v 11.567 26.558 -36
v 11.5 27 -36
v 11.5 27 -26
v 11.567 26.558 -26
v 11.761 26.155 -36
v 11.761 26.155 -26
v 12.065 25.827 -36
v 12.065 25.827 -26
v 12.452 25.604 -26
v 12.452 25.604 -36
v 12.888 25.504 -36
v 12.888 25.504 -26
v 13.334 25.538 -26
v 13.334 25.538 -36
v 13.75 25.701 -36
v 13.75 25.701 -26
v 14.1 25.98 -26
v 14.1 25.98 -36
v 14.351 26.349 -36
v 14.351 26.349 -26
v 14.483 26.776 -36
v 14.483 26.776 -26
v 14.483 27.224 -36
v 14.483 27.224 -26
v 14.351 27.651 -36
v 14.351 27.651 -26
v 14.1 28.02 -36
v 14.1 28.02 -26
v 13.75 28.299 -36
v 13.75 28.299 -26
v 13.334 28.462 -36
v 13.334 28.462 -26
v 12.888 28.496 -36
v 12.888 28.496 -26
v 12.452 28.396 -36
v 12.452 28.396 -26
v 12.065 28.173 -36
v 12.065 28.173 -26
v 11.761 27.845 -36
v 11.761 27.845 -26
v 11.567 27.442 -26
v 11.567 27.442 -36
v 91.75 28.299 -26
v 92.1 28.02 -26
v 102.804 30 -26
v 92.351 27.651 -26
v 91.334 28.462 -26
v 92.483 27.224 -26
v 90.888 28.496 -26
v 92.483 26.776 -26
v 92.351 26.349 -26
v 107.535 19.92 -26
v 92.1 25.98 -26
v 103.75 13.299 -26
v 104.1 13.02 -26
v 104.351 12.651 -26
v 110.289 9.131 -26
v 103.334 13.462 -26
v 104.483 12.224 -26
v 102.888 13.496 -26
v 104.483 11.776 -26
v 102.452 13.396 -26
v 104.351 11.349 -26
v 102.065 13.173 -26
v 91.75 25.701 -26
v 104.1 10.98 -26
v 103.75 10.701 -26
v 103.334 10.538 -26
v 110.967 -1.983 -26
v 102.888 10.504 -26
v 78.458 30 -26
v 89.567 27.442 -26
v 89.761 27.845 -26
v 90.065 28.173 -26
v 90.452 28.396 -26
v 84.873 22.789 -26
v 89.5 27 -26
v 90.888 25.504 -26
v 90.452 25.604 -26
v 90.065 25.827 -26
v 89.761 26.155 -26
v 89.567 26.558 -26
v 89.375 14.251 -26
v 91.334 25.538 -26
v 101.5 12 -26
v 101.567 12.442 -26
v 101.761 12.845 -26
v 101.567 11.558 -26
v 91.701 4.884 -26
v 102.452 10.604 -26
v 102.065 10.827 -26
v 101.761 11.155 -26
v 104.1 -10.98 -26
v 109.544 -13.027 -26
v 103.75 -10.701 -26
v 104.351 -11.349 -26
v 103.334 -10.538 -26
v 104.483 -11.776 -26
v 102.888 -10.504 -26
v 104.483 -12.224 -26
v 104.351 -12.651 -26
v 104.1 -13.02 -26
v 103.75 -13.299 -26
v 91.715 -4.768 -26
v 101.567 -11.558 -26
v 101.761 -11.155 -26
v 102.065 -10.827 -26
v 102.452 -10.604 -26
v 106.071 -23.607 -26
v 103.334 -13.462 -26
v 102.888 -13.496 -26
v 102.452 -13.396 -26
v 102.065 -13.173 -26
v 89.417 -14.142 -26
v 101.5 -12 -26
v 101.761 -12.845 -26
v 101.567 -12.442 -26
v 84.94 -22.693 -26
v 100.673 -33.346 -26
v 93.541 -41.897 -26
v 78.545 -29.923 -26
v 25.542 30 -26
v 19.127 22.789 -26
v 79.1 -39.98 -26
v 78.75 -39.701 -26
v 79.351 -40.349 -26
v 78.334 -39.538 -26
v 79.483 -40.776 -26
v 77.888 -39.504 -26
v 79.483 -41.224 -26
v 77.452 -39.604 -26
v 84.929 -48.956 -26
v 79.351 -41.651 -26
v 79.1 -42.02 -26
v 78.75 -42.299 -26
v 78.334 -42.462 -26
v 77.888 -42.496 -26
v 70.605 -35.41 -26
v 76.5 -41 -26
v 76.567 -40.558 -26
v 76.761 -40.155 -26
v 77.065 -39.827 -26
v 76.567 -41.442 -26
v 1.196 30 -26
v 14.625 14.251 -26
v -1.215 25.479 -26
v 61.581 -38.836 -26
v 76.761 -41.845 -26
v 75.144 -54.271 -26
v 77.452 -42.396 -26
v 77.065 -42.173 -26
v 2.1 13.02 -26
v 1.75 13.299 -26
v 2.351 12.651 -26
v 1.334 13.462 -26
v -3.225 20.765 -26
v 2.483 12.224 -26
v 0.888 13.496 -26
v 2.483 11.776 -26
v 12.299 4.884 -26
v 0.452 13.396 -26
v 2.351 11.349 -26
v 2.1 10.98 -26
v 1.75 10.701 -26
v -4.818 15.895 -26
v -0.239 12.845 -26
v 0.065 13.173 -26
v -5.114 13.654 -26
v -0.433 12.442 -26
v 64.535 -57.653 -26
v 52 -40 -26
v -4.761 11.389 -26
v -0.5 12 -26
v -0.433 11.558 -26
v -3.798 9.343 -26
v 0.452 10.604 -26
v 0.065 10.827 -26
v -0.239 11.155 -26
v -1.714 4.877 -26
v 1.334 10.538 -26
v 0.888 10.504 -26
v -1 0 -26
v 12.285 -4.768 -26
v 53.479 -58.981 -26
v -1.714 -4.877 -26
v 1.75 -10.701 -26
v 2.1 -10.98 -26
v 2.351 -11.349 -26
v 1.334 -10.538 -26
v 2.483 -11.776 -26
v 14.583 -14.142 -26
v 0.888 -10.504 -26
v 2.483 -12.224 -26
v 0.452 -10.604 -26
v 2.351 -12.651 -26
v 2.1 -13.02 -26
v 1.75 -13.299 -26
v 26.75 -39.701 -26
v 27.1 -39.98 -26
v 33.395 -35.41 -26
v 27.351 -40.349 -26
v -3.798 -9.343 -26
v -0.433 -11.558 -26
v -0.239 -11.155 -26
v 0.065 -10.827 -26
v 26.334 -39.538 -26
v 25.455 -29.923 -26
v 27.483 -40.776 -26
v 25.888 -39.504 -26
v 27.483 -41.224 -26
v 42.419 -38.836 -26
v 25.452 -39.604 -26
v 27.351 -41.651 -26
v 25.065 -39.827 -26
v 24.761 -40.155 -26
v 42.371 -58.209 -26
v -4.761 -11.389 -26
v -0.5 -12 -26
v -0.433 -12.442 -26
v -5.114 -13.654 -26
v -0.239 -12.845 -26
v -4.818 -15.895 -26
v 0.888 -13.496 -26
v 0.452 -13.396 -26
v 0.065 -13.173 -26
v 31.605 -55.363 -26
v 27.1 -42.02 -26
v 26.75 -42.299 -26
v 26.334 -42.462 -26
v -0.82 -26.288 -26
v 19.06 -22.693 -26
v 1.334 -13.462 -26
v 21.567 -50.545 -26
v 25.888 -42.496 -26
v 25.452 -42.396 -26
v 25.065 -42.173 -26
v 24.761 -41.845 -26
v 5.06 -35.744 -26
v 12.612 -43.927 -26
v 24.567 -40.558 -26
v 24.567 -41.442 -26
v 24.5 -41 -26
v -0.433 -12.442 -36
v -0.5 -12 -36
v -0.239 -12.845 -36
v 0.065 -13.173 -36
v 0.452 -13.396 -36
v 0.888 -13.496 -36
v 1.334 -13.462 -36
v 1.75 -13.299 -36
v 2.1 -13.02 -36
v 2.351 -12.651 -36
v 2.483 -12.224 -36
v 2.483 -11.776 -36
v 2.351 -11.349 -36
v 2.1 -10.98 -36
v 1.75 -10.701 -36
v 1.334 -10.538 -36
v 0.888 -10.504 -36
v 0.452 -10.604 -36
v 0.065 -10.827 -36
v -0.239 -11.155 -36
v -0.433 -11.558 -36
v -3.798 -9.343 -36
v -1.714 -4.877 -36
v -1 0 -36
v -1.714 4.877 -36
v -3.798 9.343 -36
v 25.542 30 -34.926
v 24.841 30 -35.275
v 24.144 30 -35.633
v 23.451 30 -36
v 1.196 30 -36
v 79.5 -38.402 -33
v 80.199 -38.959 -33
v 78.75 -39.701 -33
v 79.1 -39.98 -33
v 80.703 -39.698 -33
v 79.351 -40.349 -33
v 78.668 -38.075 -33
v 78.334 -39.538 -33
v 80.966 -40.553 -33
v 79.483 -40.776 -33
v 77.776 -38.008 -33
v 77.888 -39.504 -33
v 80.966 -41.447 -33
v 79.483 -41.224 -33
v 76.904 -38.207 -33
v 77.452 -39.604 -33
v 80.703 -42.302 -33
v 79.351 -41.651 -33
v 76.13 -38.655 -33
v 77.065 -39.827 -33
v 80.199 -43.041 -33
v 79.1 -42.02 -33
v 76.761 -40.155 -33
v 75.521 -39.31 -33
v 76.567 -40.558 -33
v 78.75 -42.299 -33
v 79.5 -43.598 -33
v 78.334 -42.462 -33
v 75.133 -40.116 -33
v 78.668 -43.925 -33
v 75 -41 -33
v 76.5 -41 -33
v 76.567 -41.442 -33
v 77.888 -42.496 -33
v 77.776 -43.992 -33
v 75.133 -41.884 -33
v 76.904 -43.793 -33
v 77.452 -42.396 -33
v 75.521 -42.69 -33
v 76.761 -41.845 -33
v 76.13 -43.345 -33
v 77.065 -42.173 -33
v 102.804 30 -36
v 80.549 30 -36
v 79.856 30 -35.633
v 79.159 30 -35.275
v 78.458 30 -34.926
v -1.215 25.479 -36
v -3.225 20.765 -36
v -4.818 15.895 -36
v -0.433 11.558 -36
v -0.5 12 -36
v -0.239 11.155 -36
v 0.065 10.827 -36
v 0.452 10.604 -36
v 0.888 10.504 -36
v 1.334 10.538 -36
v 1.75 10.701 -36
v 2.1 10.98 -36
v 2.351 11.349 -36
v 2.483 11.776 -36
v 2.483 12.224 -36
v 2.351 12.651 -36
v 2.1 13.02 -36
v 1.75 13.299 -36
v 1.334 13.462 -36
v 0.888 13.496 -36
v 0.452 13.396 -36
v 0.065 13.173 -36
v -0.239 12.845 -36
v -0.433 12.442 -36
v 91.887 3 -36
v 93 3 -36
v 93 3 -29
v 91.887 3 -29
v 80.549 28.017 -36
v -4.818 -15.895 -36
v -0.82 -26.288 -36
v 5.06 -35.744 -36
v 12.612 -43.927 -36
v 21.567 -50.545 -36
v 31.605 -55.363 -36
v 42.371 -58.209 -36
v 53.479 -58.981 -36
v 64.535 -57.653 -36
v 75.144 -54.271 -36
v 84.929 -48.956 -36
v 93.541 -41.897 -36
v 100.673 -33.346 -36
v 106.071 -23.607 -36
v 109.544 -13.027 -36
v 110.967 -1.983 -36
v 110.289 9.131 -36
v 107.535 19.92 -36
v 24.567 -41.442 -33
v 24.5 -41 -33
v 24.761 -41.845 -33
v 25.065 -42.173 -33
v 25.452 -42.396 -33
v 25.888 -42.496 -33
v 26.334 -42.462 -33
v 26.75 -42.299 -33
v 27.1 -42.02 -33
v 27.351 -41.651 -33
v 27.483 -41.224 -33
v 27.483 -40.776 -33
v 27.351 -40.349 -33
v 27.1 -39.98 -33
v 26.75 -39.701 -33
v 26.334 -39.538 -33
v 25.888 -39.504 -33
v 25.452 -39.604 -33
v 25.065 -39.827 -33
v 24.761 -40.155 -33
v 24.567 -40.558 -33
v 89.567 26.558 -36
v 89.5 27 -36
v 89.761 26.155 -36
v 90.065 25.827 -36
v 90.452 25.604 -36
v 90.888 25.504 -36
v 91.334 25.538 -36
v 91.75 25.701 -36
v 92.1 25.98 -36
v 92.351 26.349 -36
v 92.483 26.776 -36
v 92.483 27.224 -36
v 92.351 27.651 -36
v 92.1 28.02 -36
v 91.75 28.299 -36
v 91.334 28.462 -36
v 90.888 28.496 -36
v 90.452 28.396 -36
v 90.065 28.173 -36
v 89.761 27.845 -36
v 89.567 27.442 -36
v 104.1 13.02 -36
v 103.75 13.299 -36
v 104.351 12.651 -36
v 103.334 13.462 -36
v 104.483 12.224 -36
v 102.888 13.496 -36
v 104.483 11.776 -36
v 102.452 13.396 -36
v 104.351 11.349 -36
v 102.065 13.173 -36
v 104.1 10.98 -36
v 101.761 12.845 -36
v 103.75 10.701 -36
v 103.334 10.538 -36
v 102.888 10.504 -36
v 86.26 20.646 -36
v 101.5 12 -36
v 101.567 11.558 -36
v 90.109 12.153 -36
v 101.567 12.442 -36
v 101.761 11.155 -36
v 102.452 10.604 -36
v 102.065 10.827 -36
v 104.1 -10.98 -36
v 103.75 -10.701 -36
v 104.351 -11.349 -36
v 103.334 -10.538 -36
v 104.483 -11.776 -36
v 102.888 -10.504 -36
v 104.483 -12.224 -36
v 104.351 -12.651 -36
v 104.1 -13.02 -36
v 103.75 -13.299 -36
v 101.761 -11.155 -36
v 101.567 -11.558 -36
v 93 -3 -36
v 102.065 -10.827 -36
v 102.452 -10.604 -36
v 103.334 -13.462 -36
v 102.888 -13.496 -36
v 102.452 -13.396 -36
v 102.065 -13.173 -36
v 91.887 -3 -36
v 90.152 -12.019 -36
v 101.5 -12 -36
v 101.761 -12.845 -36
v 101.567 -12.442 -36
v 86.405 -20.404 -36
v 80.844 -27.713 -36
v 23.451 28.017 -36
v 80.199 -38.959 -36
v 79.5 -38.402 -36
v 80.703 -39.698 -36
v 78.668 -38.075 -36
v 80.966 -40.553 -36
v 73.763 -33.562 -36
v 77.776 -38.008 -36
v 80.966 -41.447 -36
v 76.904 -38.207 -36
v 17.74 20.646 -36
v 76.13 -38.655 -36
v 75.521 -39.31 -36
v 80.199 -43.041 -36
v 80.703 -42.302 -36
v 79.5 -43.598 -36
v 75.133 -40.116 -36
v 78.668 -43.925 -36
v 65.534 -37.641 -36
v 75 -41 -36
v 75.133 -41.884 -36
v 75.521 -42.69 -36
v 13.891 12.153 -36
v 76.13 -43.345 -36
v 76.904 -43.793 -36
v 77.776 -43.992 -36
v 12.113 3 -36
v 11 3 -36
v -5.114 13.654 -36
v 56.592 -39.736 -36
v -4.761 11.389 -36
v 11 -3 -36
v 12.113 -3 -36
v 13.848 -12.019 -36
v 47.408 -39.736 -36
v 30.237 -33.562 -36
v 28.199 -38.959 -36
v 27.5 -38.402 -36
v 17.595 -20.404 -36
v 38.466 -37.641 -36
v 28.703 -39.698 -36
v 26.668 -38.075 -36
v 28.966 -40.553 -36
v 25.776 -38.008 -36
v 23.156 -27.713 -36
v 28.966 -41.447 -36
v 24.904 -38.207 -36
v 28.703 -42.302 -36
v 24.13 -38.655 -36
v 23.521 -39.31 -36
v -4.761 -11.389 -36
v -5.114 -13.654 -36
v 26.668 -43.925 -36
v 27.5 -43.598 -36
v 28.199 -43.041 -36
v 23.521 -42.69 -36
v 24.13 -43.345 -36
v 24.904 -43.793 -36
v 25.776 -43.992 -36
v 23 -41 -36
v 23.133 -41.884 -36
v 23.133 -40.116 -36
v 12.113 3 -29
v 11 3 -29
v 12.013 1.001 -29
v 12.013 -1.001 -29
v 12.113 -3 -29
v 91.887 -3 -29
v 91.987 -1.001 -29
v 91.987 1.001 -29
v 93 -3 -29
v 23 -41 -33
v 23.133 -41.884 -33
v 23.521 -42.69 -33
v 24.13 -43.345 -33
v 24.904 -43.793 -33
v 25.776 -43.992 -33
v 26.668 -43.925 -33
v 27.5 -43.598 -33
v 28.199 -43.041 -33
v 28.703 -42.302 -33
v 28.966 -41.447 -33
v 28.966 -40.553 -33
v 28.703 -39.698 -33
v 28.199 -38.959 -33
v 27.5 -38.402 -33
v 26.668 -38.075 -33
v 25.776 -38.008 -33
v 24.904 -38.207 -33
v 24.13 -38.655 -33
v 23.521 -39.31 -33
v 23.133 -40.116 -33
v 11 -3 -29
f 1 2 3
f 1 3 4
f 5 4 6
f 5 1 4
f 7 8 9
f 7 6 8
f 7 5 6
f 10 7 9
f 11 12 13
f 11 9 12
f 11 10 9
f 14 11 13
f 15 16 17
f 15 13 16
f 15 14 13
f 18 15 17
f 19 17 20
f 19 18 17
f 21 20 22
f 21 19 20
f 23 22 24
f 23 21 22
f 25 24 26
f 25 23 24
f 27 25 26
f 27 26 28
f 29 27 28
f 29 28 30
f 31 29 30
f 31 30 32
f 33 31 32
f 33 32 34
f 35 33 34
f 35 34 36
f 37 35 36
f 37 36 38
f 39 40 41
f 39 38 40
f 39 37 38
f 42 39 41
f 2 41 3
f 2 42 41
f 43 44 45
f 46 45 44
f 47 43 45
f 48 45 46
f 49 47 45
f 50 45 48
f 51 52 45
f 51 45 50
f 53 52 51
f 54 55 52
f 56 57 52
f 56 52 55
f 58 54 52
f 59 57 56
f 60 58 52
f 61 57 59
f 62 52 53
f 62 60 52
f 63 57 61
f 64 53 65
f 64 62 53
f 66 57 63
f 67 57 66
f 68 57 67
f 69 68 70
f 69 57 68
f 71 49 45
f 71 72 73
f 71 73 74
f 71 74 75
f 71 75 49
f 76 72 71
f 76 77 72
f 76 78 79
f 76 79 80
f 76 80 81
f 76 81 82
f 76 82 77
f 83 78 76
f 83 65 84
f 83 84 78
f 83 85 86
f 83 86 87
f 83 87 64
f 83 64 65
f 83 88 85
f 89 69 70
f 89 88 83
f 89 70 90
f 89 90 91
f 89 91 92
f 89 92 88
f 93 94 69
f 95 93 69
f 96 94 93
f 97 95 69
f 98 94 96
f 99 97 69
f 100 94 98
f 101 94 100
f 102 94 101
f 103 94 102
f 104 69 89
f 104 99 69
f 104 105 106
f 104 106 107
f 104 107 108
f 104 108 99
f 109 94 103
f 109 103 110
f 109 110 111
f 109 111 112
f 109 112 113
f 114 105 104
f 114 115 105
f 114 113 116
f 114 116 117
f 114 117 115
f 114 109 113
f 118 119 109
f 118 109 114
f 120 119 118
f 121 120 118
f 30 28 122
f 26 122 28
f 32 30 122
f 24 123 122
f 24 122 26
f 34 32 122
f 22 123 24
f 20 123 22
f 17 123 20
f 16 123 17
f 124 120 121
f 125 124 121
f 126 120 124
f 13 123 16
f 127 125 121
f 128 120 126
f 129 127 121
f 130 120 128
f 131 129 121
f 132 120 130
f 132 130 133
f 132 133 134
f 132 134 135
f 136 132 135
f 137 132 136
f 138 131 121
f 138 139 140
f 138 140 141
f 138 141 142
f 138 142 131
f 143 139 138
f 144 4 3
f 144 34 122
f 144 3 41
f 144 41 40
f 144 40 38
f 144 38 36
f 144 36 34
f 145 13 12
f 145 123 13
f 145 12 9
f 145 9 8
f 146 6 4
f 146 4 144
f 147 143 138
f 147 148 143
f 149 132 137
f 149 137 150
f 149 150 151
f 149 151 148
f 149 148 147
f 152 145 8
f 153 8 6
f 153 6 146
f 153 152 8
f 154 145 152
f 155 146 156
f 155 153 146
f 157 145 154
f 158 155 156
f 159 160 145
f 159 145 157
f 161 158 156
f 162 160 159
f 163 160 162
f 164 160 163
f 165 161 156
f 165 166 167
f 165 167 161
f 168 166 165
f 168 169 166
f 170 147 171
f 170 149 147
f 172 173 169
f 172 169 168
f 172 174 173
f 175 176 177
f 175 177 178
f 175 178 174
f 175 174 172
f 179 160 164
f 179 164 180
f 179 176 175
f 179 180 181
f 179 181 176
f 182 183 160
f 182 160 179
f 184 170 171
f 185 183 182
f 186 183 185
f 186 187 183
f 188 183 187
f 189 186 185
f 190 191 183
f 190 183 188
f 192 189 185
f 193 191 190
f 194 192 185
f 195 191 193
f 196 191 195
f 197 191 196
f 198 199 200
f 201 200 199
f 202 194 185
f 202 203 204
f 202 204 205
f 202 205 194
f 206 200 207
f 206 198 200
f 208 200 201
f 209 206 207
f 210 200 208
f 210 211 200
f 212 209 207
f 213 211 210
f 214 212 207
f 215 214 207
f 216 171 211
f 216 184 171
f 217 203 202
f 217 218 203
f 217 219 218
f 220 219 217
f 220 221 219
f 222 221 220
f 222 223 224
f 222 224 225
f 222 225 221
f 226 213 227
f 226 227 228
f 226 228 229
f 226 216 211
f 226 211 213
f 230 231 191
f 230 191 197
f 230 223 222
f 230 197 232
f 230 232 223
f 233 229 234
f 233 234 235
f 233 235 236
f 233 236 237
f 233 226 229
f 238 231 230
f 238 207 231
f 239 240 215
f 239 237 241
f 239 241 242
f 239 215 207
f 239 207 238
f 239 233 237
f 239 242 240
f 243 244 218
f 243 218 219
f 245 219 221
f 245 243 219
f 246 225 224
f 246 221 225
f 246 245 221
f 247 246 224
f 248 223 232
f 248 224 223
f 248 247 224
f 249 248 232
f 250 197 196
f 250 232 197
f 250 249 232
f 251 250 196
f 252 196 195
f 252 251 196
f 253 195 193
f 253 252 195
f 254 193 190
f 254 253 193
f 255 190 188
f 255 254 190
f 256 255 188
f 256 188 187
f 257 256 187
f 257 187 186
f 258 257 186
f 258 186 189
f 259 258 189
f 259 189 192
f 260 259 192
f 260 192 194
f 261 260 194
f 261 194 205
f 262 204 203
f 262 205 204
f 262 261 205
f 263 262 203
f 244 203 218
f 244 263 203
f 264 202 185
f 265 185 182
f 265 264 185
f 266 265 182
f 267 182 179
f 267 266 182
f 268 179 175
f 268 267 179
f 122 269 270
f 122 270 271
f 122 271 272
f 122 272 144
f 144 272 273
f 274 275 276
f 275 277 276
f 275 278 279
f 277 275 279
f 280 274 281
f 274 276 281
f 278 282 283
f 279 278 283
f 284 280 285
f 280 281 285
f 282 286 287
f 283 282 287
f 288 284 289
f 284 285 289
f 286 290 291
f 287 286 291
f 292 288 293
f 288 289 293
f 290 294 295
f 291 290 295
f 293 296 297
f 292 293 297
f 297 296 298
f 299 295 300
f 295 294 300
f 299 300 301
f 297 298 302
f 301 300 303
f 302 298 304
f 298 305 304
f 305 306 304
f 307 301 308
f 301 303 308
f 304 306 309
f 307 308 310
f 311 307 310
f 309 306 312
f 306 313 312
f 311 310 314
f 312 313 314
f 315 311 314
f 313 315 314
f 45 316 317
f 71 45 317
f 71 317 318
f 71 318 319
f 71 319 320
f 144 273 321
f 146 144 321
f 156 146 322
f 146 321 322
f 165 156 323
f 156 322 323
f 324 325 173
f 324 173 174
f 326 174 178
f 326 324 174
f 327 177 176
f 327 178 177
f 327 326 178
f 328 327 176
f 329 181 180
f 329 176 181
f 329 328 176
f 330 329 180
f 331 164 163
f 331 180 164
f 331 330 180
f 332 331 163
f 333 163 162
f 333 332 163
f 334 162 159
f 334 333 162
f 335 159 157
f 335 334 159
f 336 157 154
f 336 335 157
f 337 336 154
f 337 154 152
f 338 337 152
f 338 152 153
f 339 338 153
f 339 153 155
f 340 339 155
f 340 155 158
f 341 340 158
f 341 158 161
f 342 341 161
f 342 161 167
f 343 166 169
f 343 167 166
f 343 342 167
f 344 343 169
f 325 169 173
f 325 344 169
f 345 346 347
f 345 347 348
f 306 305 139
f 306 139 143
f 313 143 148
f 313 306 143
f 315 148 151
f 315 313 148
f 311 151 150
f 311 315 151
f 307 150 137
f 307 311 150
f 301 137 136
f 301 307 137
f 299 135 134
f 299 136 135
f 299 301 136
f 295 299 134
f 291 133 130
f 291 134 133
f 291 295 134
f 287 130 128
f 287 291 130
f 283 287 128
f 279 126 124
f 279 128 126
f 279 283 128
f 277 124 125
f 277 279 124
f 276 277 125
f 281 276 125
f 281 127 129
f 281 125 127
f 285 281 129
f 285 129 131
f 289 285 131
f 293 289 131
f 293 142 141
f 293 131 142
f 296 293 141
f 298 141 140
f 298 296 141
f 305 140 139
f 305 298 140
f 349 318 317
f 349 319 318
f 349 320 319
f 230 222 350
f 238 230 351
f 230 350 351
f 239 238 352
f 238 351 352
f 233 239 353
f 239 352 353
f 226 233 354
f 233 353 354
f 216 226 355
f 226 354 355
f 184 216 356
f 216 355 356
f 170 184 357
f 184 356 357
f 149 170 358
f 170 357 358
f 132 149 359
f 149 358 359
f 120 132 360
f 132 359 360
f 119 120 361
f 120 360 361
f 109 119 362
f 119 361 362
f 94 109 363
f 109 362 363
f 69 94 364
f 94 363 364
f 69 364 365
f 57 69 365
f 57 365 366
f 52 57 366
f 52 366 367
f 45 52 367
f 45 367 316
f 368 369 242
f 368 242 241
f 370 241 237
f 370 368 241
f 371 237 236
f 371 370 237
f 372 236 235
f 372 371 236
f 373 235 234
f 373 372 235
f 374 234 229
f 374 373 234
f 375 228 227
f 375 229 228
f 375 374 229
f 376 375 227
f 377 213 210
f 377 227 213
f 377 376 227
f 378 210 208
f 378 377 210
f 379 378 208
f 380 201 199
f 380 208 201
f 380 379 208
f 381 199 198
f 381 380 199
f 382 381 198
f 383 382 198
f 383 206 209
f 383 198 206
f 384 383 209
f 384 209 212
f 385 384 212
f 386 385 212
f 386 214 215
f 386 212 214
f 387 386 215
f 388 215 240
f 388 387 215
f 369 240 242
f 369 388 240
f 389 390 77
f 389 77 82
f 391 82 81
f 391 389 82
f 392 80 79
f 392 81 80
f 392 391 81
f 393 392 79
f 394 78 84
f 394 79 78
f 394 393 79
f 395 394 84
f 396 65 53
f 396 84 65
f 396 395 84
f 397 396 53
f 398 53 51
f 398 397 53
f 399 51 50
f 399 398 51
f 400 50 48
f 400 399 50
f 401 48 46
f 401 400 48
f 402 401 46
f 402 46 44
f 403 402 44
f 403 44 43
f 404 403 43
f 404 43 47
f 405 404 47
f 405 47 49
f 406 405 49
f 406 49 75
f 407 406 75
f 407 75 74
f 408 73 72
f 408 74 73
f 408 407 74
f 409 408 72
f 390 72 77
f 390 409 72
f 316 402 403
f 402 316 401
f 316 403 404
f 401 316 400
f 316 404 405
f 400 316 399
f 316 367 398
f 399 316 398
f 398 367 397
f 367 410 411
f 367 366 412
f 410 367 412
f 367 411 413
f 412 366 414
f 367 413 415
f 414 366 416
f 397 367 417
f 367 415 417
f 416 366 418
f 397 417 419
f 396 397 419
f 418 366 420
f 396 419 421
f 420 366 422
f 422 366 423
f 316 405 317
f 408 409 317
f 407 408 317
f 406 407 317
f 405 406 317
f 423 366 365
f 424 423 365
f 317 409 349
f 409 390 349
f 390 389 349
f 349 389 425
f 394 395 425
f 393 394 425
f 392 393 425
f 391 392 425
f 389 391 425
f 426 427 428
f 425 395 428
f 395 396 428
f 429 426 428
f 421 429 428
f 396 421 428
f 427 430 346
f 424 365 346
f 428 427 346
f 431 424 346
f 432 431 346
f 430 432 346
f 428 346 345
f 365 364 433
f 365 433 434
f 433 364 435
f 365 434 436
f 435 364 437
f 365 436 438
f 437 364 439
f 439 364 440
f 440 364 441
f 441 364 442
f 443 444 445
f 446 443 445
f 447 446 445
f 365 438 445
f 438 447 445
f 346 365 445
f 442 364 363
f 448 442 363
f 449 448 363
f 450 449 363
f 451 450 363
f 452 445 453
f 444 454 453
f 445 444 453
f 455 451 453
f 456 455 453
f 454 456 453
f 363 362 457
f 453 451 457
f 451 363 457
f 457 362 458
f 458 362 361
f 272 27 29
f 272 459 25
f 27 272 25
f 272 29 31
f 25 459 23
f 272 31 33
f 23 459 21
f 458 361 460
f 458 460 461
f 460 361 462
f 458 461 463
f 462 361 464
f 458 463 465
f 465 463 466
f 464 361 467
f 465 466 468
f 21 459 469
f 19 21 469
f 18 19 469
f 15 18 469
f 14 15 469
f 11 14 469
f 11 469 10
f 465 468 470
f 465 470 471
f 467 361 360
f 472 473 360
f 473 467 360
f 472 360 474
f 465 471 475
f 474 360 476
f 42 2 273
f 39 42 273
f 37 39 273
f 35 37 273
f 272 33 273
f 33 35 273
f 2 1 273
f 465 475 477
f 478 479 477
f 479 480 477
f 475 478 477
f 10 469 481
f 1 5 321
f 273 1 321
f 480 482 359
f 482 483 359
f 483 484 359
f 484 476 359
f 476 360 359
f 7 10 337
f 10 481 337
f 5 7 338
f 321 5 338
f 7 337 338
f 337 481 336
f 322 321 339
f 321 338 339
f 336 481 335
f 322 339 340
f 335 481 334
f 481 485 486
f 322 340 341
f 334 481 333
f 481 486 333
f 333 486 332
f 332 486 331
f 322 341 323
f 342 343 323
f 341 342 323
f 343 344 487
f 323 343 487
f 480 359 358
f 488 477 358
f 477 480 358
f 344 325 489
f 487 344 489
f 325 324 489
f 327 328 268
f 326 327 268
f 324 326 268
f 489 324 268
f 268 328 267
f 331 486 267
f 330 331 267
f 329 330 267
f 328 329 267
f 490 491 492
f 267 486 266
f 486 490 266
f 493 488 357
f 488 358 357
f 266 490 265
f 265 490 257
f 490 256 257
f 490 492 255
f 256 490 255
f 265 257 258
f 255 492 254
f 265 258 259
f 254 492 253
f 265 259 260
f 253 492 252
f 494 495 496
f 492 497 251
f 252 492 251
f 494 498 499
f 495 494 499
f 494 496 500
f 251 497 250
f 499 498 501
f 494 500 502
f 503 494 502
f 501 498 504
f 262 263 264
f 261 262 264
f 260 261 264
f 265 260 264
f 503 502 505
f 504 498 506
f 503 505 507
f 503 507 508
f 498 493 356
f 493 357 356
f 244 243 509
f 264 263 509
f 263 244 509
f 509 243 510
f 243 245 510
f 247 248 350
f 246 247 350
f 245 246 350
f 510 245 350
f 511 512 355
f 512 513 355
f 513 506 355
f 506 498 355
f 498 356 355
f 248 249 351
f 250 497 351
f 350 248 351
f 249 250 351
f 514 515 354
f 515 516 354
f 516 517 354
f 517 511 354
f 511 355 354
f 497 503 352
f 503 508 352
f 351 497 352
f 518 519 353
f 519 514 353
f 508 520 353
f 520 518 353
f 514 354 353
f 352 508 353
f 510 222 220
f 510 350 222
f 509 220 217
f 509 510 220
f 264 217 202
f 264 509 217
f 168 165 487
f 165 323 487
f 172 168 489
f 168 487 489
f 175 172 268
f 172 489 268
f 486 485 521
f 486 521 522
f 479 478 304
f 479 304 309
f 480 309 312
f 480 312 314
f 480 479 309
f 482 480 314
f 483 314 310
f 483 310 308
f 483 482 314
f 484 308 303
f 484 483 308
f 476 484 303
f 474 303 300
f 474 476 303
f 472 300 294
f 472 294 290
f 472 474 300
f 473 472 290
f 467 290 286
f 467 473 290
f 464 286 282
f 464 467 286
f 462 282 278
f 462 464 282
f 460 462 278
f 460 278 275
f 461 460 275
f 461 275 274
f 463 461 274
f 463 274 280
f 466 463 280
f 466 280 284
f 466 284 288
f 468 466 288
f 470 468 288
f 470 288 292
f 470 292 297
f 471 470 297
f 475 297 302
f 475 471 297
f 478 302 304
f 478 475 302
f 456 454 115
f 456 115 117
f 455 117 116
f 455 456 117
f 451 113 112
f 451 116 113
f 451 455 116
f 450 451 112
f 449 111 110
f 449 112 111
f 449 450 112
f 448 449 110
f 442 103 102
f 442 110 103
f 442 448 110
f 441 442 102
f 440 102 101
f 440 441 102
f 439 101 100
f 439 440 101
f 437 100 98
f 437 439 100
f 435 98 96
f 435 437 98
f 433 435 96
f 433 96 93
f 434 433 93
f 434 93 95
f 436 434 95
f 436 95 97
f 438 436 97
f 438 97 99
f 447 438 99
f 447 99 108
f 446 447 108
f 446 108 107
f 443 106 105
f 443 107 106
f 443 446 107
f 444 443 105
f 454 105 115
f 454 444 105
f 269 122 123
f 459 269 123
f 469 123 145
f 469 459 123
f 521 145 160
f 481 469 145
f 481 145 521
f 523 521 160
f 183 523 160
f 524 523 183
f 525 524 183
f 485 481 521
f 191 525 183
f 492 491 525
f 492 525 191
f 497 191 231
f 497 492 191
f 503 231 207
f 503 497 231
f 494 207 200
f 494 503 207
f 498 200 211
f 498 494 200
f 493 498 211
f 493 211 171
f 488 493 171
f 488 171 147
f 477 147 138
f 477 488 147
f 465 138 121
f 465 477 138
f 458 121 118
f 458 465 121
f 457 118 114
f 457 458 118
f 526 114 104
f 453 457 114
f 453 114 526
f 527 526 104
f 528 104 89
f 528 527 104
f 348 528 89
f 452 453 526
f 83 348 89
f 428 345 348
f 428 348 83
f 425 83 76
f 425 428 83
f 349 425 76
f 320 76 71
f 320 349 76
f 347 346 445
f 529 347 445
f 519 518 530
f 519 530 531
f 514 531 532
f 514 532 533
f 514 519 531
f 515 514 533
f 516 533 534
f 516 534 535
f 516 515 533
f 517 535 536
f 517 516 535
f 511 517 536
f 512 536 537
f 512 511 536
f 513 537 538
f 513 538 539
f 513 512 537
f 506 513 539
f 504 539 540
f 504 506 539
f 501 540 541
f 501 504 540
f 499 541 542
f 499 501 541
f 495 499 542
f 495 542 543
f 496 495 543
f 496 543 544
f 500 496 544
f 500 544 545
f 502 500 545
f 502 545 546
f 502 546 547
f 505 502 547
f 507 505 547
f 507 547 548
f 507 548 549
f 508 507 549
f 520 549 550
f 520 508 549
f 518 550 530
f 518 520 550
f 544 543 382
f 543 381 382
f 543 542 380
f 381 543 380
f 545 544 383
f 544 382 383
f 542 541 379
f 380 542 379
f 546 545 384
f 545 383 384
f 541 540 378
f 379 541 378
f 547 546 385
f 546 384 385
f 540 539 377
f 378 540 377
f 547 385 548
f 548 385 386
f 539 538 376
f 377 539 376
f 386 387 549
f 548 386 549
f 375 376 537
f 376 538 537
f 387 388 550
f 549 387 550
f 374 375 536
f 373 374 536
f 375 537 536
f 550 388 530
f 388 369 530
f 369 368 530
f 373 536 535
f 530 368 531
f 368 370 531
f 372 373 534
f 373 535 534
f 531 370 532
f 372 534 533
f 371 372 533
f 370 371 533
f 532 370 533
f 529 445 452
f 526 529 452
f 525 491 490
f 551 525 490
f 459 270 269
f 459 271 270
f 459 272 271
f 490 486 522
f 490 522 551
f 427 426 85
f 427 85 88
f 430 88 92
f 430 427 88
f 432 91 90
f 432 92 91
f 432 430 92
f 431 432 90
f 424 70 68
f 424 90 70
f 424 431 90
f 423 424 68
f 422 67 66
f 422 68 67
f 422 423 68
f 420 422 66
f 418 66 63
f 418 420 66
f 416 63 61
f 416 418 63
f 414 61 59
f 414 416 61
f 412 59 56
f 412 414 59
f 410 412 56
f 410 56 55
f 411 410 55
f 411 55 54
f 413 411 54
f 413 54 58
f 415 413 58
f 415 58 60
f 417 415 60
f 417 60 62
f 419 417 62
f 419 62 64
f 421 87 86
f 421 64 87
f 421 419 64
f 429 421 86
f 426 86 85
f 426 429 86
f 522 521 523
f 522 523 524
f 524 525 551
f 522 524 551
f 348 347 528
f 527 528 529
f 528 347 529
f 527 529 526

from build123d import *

# Parameters (mm, degrees)
CYLINDER2353_R         = 17
CYLINDER2353_DEPTH     = 160
CYLINDER2410_R         = 60.2
CYLINDER2410_DEPTH     = 58
BOX593_W               = 6
BOX593_H               = 6
BOX593_DEPTH           = 64
BOX592_W               = 6
BOX592_H               = 6
BOX592_DEPTH           = 64
CYLINDER2386_R         = 3
CYLINDER2386_DEPTH     = 3
CYLINDER2368_R         = 3
CYLINDER2368_DEPTH     = 3
CYLINDER2394_R         = 1.5
CYLINDER2394_DEPTH     = 32
CYLINDER2392_R         = 1.5
CYLINDER2392_DEPTH     = 32
CYLINDER2391_R         = 1.5
CYLINDER2391_DEPTH     = 100
CYLINDER2406_R         = 1.5
CYLINDER2406_DEPTH     = 100
CYLINDER2396_R         = 1.5
CYLINDER2396_DEPTH     = 50
CYLINDER2393_R         = 1.5
CYLINDER2393_DEPTH     = 50
CYLINDER2389_R         = 1.5
CYLINDER2389_DEPTH     = 50
CYLINDER2398_R         = 1.5
CYLINDER2398_DEPTH     = 50
CYLINDER2379_R         = 1.5
CYLINDER2379_DEPTH     = 100
CYLINDER2399_R         = 1.5
CYLINDER2399_DEPTH     = 100
CYLINDER2401_R         = 1.5
CYLINDER2401_DEPTH     = 100
CYLINDER2405_R         = 1.5
CYLINDER2405_DEPTH     = 100
BOX590_W               = 200
BOX590_H               = 100
BOX590_DEPTH           = 32
TUBE096_R              = 59
TUBE096_R_2            = 40
TUBE096_DEPTH          = 10
CUT574_PLACEMENT_ANGLE = 180
FILLET047_R            = 8


with BuildPart() as v_lec2353:
    # Cylinder2353 → Cylinder2353 (new body)
    with BuildSketch(Plane(origin=(-18, 0, -60), x_dir=(1, 0, 0), z_dir=(0, 0, 1))):
        Circle(CYLINDER2353_R)
    extrude(amount=CYLINDER2353_DEPTH)


with BuildPart() as v_lec2410:
    # Cylinder2410 → Cylinder2410 (new body)
    with BuildSketch(Plane(origin=(0, 19, -53), x_dir=(1, 0, 0), z_dir=(0, -1, 0))):
        Circle(CYLINDER2410_R)
    extrude(amount=CYLINDER2410_DEPTH)


with BuildPart() as krychle593:
    # Box593 → Box593 (new body)
    with BuildSketch(Plane(origin=(87, -3, -93), x_dir=(1, 0, 0), z_dir=(0, 0, 1))):
        with Locations((3, 3)):
            Rectangle(BOX593_W, BOX593_H)
    extrude(amount=BOX593_DEPTH)


with BuildPart() as compound1005:
    # Box592 → Box592 (new body)
    with BuildSketch(Plane(origin=(11, -3, -93), x_dir=(1, 0, 0), z_dir=(0, 0, 1))):
        with Locations((3, 3)):
            Rectangle(BOX592_W, BOX592_H)
    extrude(amount=BOX592_DEPTH)

    # Compound1005: union Krychle593
    add(krychle593.part)


with BuildPart() as compound1005_1:
    # Compound1005 placement: moved
    add(compound1005.part.moved(Location((-52, 0, 36))))


with BuildPart() as v_lec2386:
    # Cylinder2386 → Cylinder2386 (new body)
    with BuildSketch(Plane(origin=(78, 41, -42), x_dir=(1, 0, 0), z_dir=(0, 0, 1))):
        Circle(CYLINDER2386_R)
    extrude(amount=CYLINDER2386_DEPTH)


with BuildPart() as compound1002:
    # Cylinder2368 → Cylinder2368 (new body)
    with BuildSketch(Plane(origin=(26, 41, -42), x_dir=(1, 0, 0), z_dir=(0, 0, 1))):
        Circle(CYLINDER2368_R)
    extrude(amount=CYLINDER2368_DEPTH)

    # Compound1002: union Válec2386
    add(v_lec2386.part)


with BuildPart() as compound1002_1:
    # Compound1002 placement: moved
    add(compound1002.part.moved(Location((-52, 0, 42))))


with BuildPart() as v_lec2394:
    # Cylinder2394 → Cylinder2394 (new body)
    with BuildSketch(Plane(origin=(78, 41, -42), x_dir=(1, 0, 0), z_dir=(0, 0, 1))):
        Circle(CYLINDER2394_R)
    extrude(amount=CYLINDER2394_DEPTH)


with BuildPart() as compound1008:
    # Cylinder2392 → Cylinder2392 (new body)
    with BuildSketch(Plane(origin=(26, 41, -42), x_dir=(1, 0, 0), z_dir=(0, 0, 1))):
        Circle(CYLINDER2392_R)
    extrude(amount=CYLINDER2392_DEPTH)

    # Compound1008: union Válec2394
    add(v_lec2394.part)


with BuildPart() as compound1008_1:
    # Compound1008 placement: moved
    add(compound1008.part.moved(Location((-52, 0, 36))))


with BuildPart() as v_lec2391:
    # Cylinder2391 → Cylinder2391 (new body)
    with BuildSketch(Plane(origin=(14, 0, -60), x_dir=(1, 0, 0), z_dir=(0, 0, 1))):
        Circle(CYLINDER2391_R)
    extrude(amount=CYLINDER2391_DEPTH)


with BuildPart() as compound1006:
    # Cylinder2406 → Cylinder2406 (new body)
    with BuildSketch(Plane(origin=(90, 0, -60), x_dir=(1, 0, 0), z_dir=(0, 0, 1))):
        Circle(CYLINDER2406_R)
    extrude(amount=CYLINDER2406_DEPTH)

    # Compound1022: union Válec2391
    add(v_lec2391.part)


with BuildPart() as compound1006_1:
    # Compound1022 placement: moved
    add(compound1006.part.moved(Location((-52, 0, 0))))

    # Compound1006: union Compound1008
    add(compound1008_1.part)


with BuildPart() as v_lec2396:
    # Cylinder2396 → Cylinder2396 (new body)
    with BuildSketch(Plane(origin=(-51, 6, 0), x_dir=(1, 0, 0), z_dir=(0, 0, 1))):
        Circle(CYLINDER2396_R)
    extrude(amount=CYLINDER2396_DEPTH)


with BuildPart() as v_lec2393:
    # Cylinder2393 → Cylinder2393 (new body)
    with BuildSketch(Plane(origin=(-24, 18, 0), x_dir=(1, 0, 0), z_dir=(0, 0, 1))):
        Circle(CYLINDER2393_R)
    extrude(amount=CYLINDER2393_DEPTH)


with BuildPart() as v_lec2389:
    # Cylinder2389 → Cylinder2389 (new body)
    with BuildSketch(Plane(origin=(24, 18, 0), x_dir=(1, 0, 0), z_dir=(0, 0, 1))):
        Circle(CYLINDER2389_R)
    extrude(amount=CYLINDER2389_DEPTH)


with BuildPart() as compound1015:
    # Cylinder2398 → Cylinder2398 (new body)
    with BuildSketch(Plane(origin=(51, 6, 0), x_dir=(1, 0, 0), z_dir=(0, 0, 1))):
        Circle(CYLINDER2398_R)
    extrude(amount=CYLINDER2398_DEPTH)

    # Compound1015: union Válec2396, Válec2393, Válec2389
    add(v_lec2396.part)
    add(v_lec2393.part)
    add(v_lec2389.part)


with BuildPart() as compound1015_1:
    # Compound1015 placement: moved
    add(compound1015.part.moved(Location((0, 6, 0))))


with BuildPart() as v_lec2379:
    # Cylinder2379 → Cylinder2379 (new body)
    with BuildSketch(Plane(origin=(51, -12, 0), x_dir=(1, 0, 0), z_dir=(0, 0, 1))):
        Circle(CYLINDER2379_R)
    extrude(amount=CYLINDER2379_DEPTH)


with BuildPart() as compound997:
    # Cylinder2399 → Cylinder2399 (new body)
    with BuildSketch(Plane(origin=(-51, -12, 0), x_dir=(1, 0, 0), z_dir=(0, 0, 1))):
        Circle(CYLINDER2399_R)
    extrude(amount=CYLINDER2399_DEPTH)

    # Compound997: union Válec2379
    add(v_lec2379.part)


with BuildPart() as v_lec2401:
    # Cylinder2401 → Cylinder2401 (new body)
    with BuildSketch(Plane(origin=(39, -21, 0), x_dir=(1, 0, 0), z_dir=(0, 0, 1))):
        Circle(CYLINDER2401_R)
    extrude(amount=CYLINDER2401_DEPTH)


with BuildPart() as compound1018:
    # Cylinder2405 → Cylinder2405 (new body)
    with BuildSketch(Plane(origin=(-39, -21, 0), x_dir=(1, 0, 0), z_dir=(0, 0, 1))):
        Circle(CYLINDER2405_R)
    extrude(amount=CYLINDER2405_DEPTH)

    # Compound1017: union Válec2401
    add(v_lec2401.part)


with BuildPart() as compound1018_1:
    # Compound1017 placement: moved
    add(compound1018.part.moved(Location((0, -6, 0))))

    # Compound1018: union Compound1015, Compound997
    add(compound1015_1.part)
    add(compound997.part)


with BuildPart() as compound1018_2:
    # Compound1018 placement: moved
    add(compound1018_1.part.moved(Location((0, 0, -10))))


with BuildPart() as krychle590:
    # Box590 → Box590 (new body)
    with BuildSketch(Plane(origin=(-100, -130, 0), x_dir=(1, 0, 0), z_dir=(0, 0, 1))):
        with Locations((100, 50)):
            Rectangle(BOX590_W, BOX590_H)
    extrude(amount=BOX590_DEPTH)


with BuildPart() as fillet047:
    # Tube096 → Tube096 (new body)
    with BuildSketch(Plane.XY):
        Circle(TUBE096_R)
        Circle(TUBE096_R_2, mode=Mode.SUBTRACT)
    extrude(amount=TUBE096_DEPTH)

    # Cut575: cut Krychle590
    add(krychle590.part, mode=Mode.SUBTRACT)

    # Cut591: cut Compound1018
    add(compound1018_2.part, mode=Mode.SUBTRACT)

    # Cut585: cut Compound1006
    add(compound1006_1.part, mode=Mode.SUBTRACT)

    # Cut578: cut Compound1002
    add(compound1002_1.part, mode=Mode.SUBTRACT)

    # Cut592: cut Compound1005
    add(compound1005_1.part, mode=Mode.SUBTRACT)

    # Cut574: cut Válec2410
    add(v_lec2410.part, mode=Mode.SUBTRACT)


with BuildPart() as fillet047_1:
    # Cut574 placement: moved
    add(fillet047.part.moved(Location((52, 0, -36))).rotate(Axis((52, 0, -36), (0, 0, 1)), CUT574_PLACEMENT_ANGLE))

    # Cut593: cut Válec2353
    add(v_lec2353.part, mode=Mode.SUBTRACT)

    # Fillet047
    fillet047_edges = [fillet047_1.edges().sort_by_distance(p)[0] for p in [
        (-5.8, 11.838919, -31),
        (-5.8, -11.838919, -31),
    ]]
    fillet(fillet047_edges, radius=FILLET047_R)


solid = fillet047_1.part
